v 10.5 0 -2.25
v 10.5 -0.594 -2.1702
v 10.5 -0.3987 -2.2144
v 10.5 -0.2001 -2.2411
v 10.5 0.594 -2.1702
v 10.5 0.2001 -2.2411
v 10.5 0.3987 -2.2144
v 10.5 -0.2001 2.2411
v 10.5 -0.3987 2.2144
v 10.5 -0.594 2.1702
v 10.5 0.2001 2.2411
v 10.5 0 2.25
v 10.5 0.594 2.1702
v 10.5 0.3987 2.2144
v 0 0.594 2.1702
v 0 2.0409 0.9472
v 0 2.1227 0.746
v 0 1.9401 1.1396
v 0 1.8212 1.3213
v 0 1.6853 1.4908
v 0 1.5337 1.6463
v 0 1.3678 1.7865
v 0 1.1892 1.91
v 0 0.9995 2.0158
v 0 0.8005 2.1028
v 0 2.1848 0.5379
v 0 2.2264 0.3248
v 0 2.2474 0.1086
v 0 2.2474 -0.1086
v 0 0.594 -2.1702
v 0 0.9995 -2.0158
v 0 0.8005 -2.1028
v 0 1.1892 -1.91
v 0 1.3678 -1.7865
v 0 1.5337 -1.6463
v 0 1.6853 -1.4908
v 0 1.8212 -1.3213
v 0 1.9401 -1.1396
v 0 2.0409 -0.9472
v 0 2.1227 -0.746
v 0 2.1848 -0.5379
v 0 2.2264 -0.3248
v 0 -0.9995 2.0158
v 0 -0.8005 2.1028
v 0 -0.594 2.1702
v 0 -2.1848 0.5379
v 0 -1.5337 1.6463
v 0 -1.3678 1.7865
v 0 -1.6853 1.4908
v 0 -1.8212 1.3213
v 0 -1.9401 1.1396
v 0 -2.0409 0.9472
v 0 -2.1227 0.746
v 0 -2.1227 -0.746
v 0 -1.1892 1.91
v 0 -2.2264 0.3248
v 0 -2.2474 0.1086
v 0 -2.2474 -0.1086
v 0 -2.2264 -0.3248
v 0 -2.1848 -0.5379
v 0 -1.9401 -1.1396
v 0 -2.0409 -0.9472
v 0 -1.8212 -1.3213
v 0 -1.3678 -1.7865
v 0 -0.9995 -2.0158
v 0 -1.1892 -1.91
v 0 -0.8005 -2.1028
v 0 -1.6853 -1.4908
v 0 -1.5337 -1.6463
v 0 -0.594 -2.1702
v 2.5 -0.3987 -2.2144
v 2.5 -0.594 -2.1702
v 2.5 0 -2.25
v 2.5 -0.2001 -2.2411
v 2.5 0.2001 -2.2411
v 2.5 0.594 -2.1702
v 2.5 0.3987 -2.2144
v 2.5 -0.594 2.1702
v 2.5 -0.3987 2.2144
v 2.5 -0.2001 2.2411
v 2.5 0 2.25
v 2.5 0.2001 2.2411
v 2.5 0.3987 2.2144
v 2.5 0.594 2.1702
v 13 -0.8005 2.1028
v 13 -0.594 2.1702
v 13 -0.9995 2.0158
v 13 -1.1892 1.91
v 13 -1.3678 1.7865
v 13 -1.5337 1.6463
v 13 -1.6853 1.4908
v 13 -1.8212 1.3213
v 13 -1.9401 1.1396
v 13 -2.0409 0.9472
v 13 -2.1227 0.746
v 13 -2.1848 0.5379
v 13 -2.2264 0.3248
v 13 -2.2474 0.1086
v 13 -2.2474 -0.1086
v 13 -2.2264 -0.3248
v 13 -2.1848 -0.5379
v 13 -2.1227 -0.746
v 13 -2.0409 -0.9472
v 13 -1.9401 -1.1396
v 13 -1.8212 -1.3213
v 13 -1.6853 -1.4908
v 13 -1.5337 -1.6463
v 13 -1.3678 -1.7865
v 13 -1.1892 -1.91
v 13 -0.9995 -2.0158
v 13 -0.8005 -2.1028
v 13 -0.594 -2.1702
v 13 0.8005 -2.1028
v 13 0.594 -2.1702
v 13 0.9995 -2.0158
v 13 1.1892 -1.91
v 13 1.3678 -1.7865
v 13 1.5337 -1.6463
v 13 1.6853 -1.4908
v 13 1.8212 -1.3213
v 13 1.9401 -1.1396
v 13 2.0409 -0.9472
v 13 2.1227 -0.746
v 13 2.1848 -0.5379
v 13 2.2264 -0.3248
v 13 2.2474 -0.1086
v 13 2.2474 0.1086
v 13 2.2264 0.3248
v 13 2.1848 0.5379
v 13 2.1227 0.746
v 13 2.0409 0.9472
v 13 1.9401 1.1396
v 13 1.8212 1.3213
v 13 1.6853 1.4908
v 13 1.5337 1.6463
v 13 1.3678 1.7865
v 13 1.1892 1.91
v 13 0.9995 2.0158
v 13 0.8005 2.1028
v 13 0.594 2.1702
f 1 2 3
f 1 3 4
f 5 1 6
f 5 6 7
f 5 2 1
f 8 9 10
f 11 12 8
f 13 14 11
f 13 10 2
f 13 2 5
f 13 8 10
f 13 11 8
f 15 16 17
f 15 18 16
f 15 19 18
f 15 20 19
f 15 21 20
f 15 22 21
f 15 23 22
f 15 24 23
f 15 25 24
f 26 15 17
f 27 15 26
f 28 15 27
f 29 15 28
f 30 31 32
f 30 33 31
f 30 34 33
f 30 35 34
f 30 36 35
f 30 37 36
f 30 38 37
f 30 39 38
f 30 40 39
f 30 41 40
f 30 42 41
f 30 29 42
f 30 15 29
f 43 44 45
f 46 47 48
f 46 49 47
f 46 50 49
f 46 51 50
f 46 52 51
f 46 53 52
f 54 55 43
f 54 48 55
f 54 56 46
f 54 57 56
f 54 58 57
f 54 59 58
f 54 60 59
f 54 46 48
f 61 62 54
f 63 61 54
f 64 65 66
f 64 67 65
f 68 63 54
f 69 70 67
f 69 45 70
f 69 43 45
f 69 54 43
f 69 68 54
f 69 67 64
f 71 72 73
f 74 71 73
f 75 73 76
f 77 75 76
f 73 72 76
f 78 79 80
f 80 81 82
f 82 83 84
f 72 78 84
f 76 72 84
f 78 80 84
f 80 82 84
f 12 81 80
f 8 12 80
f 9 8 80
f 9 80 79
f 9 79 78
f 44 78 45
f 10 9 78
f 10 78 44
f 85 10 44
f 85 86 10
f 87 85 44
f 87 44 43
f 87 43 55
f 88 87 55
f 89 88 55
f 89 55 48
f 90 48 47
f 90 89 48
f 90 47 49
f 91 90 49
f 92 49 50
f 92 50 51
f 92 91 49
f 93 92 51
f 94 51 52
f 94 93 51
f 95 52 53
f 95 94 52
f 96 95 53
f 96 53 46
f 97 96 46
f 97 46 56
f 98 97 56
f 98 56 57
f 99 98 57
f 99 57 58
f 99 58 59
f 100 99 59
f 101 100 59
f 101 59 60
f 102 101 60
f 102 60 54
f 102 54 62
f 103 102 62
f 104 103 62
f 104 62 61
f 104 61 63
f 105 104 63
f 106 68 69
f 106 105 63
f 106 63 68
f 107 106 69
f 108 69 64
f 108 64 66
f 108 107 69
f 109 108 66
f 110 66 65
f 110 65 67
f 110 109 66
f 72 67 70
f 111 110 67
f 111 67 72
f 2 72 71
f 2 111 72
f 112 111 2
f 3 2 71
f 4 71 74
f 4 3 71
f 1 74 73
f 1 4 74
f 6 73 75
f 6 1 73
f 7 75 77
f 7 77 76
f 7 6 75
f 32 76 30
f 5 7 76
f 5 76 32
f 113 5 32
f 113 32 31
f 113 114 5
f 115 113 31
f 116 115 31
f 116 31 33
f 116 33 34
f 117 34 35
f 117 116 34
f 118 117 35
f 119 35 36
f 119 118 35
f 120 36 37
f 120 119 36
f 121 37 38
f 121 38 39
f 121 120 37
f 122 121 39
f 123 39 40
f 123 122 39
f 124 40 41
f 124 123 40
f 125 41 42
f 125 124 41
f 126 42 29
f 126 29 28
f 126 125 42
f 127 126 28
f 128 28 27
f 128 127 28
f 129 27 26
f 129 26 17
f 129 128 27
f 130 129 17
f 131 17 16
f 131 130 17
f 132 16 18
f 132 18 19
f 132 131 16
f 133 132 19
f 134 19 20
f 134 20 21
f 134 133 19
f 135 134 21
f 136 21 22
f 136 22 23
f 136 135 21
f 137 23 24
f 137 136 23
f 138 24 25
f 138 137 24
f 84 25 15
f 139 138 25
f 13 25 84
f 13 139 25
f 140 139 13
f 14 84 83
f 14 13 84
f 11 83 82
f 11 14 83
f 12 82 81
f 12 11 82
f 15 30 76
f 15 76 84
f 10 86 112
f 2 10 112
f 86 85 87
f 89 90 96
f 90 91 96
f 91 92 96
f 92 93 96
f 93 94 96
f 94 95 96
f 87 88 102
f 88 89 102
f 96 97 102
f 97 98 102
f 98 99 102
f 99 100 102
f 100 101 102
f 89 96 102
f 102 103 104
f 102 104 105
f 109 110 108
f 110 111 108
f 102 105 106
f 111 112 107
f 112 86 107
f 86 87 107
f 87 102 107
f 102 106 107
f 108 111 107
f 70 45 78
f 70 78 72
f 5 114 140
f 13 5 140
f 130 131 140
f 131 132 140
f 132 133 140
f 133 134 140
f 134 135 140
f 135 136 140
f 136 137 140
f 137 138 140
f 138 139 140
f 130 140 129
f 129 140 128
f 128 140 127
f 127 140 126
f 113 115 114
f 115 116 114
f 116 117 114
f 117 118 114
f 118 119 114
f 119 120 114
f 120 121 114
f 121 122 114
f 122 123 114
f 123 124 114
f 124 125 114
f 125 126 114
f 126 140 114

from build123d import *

# Parameters (mm, degrees)
F0_W     = 13
F0_H     = 2.25
F3_DEPTH = 2.5


# Not quite as in the source:
# - a pattern or mirror of a feature is missing from the dataset's text; its kind, count and spacing are read off the source's solid


with BuildPart() as f1:
    # F0 (on Front) → F1 (revolve)
    with BuildSketch(Plane.XZ):
        with Locations((6.5, 1.125)):
            Rectangle(F0_W, F0_H)
    revolve(axis=Axis((6.5, 0, 0), (1, 0, 0)))

    # F2 (on face) → F3 (cut)
    with BuildSketch(Plane.YZ.offset(13)):
        with BuildLine():
            Line((0.5940446135, -2.170163818), (0.5940446135, 2.170163818))
            ThreePointArc((0.5940446135, 2.170163818), (0, 2.25), (-0.5940446135, 2.170163818))
            Line((-0.5940446135, 2.170163818), (-0.5940446135, -2.170163818))
            ThreePointArc((-0.5940446135, -2.170163818), (0, -2.25), (0.5940446135, -2.170163818))
        make_face()
    f3 = extrude(amount=-F3_DEPTH, mode=Mode.SUBTRACT)

    # F3_copies: F3 across plane
    add(f3.mirror(Plane(origin=(6.5, 0, 0), x_dir=(0, 0, -1), z_dir=(-1, 0, 0))), mode=Mode.SUBTRACT)


solid = f1.part
